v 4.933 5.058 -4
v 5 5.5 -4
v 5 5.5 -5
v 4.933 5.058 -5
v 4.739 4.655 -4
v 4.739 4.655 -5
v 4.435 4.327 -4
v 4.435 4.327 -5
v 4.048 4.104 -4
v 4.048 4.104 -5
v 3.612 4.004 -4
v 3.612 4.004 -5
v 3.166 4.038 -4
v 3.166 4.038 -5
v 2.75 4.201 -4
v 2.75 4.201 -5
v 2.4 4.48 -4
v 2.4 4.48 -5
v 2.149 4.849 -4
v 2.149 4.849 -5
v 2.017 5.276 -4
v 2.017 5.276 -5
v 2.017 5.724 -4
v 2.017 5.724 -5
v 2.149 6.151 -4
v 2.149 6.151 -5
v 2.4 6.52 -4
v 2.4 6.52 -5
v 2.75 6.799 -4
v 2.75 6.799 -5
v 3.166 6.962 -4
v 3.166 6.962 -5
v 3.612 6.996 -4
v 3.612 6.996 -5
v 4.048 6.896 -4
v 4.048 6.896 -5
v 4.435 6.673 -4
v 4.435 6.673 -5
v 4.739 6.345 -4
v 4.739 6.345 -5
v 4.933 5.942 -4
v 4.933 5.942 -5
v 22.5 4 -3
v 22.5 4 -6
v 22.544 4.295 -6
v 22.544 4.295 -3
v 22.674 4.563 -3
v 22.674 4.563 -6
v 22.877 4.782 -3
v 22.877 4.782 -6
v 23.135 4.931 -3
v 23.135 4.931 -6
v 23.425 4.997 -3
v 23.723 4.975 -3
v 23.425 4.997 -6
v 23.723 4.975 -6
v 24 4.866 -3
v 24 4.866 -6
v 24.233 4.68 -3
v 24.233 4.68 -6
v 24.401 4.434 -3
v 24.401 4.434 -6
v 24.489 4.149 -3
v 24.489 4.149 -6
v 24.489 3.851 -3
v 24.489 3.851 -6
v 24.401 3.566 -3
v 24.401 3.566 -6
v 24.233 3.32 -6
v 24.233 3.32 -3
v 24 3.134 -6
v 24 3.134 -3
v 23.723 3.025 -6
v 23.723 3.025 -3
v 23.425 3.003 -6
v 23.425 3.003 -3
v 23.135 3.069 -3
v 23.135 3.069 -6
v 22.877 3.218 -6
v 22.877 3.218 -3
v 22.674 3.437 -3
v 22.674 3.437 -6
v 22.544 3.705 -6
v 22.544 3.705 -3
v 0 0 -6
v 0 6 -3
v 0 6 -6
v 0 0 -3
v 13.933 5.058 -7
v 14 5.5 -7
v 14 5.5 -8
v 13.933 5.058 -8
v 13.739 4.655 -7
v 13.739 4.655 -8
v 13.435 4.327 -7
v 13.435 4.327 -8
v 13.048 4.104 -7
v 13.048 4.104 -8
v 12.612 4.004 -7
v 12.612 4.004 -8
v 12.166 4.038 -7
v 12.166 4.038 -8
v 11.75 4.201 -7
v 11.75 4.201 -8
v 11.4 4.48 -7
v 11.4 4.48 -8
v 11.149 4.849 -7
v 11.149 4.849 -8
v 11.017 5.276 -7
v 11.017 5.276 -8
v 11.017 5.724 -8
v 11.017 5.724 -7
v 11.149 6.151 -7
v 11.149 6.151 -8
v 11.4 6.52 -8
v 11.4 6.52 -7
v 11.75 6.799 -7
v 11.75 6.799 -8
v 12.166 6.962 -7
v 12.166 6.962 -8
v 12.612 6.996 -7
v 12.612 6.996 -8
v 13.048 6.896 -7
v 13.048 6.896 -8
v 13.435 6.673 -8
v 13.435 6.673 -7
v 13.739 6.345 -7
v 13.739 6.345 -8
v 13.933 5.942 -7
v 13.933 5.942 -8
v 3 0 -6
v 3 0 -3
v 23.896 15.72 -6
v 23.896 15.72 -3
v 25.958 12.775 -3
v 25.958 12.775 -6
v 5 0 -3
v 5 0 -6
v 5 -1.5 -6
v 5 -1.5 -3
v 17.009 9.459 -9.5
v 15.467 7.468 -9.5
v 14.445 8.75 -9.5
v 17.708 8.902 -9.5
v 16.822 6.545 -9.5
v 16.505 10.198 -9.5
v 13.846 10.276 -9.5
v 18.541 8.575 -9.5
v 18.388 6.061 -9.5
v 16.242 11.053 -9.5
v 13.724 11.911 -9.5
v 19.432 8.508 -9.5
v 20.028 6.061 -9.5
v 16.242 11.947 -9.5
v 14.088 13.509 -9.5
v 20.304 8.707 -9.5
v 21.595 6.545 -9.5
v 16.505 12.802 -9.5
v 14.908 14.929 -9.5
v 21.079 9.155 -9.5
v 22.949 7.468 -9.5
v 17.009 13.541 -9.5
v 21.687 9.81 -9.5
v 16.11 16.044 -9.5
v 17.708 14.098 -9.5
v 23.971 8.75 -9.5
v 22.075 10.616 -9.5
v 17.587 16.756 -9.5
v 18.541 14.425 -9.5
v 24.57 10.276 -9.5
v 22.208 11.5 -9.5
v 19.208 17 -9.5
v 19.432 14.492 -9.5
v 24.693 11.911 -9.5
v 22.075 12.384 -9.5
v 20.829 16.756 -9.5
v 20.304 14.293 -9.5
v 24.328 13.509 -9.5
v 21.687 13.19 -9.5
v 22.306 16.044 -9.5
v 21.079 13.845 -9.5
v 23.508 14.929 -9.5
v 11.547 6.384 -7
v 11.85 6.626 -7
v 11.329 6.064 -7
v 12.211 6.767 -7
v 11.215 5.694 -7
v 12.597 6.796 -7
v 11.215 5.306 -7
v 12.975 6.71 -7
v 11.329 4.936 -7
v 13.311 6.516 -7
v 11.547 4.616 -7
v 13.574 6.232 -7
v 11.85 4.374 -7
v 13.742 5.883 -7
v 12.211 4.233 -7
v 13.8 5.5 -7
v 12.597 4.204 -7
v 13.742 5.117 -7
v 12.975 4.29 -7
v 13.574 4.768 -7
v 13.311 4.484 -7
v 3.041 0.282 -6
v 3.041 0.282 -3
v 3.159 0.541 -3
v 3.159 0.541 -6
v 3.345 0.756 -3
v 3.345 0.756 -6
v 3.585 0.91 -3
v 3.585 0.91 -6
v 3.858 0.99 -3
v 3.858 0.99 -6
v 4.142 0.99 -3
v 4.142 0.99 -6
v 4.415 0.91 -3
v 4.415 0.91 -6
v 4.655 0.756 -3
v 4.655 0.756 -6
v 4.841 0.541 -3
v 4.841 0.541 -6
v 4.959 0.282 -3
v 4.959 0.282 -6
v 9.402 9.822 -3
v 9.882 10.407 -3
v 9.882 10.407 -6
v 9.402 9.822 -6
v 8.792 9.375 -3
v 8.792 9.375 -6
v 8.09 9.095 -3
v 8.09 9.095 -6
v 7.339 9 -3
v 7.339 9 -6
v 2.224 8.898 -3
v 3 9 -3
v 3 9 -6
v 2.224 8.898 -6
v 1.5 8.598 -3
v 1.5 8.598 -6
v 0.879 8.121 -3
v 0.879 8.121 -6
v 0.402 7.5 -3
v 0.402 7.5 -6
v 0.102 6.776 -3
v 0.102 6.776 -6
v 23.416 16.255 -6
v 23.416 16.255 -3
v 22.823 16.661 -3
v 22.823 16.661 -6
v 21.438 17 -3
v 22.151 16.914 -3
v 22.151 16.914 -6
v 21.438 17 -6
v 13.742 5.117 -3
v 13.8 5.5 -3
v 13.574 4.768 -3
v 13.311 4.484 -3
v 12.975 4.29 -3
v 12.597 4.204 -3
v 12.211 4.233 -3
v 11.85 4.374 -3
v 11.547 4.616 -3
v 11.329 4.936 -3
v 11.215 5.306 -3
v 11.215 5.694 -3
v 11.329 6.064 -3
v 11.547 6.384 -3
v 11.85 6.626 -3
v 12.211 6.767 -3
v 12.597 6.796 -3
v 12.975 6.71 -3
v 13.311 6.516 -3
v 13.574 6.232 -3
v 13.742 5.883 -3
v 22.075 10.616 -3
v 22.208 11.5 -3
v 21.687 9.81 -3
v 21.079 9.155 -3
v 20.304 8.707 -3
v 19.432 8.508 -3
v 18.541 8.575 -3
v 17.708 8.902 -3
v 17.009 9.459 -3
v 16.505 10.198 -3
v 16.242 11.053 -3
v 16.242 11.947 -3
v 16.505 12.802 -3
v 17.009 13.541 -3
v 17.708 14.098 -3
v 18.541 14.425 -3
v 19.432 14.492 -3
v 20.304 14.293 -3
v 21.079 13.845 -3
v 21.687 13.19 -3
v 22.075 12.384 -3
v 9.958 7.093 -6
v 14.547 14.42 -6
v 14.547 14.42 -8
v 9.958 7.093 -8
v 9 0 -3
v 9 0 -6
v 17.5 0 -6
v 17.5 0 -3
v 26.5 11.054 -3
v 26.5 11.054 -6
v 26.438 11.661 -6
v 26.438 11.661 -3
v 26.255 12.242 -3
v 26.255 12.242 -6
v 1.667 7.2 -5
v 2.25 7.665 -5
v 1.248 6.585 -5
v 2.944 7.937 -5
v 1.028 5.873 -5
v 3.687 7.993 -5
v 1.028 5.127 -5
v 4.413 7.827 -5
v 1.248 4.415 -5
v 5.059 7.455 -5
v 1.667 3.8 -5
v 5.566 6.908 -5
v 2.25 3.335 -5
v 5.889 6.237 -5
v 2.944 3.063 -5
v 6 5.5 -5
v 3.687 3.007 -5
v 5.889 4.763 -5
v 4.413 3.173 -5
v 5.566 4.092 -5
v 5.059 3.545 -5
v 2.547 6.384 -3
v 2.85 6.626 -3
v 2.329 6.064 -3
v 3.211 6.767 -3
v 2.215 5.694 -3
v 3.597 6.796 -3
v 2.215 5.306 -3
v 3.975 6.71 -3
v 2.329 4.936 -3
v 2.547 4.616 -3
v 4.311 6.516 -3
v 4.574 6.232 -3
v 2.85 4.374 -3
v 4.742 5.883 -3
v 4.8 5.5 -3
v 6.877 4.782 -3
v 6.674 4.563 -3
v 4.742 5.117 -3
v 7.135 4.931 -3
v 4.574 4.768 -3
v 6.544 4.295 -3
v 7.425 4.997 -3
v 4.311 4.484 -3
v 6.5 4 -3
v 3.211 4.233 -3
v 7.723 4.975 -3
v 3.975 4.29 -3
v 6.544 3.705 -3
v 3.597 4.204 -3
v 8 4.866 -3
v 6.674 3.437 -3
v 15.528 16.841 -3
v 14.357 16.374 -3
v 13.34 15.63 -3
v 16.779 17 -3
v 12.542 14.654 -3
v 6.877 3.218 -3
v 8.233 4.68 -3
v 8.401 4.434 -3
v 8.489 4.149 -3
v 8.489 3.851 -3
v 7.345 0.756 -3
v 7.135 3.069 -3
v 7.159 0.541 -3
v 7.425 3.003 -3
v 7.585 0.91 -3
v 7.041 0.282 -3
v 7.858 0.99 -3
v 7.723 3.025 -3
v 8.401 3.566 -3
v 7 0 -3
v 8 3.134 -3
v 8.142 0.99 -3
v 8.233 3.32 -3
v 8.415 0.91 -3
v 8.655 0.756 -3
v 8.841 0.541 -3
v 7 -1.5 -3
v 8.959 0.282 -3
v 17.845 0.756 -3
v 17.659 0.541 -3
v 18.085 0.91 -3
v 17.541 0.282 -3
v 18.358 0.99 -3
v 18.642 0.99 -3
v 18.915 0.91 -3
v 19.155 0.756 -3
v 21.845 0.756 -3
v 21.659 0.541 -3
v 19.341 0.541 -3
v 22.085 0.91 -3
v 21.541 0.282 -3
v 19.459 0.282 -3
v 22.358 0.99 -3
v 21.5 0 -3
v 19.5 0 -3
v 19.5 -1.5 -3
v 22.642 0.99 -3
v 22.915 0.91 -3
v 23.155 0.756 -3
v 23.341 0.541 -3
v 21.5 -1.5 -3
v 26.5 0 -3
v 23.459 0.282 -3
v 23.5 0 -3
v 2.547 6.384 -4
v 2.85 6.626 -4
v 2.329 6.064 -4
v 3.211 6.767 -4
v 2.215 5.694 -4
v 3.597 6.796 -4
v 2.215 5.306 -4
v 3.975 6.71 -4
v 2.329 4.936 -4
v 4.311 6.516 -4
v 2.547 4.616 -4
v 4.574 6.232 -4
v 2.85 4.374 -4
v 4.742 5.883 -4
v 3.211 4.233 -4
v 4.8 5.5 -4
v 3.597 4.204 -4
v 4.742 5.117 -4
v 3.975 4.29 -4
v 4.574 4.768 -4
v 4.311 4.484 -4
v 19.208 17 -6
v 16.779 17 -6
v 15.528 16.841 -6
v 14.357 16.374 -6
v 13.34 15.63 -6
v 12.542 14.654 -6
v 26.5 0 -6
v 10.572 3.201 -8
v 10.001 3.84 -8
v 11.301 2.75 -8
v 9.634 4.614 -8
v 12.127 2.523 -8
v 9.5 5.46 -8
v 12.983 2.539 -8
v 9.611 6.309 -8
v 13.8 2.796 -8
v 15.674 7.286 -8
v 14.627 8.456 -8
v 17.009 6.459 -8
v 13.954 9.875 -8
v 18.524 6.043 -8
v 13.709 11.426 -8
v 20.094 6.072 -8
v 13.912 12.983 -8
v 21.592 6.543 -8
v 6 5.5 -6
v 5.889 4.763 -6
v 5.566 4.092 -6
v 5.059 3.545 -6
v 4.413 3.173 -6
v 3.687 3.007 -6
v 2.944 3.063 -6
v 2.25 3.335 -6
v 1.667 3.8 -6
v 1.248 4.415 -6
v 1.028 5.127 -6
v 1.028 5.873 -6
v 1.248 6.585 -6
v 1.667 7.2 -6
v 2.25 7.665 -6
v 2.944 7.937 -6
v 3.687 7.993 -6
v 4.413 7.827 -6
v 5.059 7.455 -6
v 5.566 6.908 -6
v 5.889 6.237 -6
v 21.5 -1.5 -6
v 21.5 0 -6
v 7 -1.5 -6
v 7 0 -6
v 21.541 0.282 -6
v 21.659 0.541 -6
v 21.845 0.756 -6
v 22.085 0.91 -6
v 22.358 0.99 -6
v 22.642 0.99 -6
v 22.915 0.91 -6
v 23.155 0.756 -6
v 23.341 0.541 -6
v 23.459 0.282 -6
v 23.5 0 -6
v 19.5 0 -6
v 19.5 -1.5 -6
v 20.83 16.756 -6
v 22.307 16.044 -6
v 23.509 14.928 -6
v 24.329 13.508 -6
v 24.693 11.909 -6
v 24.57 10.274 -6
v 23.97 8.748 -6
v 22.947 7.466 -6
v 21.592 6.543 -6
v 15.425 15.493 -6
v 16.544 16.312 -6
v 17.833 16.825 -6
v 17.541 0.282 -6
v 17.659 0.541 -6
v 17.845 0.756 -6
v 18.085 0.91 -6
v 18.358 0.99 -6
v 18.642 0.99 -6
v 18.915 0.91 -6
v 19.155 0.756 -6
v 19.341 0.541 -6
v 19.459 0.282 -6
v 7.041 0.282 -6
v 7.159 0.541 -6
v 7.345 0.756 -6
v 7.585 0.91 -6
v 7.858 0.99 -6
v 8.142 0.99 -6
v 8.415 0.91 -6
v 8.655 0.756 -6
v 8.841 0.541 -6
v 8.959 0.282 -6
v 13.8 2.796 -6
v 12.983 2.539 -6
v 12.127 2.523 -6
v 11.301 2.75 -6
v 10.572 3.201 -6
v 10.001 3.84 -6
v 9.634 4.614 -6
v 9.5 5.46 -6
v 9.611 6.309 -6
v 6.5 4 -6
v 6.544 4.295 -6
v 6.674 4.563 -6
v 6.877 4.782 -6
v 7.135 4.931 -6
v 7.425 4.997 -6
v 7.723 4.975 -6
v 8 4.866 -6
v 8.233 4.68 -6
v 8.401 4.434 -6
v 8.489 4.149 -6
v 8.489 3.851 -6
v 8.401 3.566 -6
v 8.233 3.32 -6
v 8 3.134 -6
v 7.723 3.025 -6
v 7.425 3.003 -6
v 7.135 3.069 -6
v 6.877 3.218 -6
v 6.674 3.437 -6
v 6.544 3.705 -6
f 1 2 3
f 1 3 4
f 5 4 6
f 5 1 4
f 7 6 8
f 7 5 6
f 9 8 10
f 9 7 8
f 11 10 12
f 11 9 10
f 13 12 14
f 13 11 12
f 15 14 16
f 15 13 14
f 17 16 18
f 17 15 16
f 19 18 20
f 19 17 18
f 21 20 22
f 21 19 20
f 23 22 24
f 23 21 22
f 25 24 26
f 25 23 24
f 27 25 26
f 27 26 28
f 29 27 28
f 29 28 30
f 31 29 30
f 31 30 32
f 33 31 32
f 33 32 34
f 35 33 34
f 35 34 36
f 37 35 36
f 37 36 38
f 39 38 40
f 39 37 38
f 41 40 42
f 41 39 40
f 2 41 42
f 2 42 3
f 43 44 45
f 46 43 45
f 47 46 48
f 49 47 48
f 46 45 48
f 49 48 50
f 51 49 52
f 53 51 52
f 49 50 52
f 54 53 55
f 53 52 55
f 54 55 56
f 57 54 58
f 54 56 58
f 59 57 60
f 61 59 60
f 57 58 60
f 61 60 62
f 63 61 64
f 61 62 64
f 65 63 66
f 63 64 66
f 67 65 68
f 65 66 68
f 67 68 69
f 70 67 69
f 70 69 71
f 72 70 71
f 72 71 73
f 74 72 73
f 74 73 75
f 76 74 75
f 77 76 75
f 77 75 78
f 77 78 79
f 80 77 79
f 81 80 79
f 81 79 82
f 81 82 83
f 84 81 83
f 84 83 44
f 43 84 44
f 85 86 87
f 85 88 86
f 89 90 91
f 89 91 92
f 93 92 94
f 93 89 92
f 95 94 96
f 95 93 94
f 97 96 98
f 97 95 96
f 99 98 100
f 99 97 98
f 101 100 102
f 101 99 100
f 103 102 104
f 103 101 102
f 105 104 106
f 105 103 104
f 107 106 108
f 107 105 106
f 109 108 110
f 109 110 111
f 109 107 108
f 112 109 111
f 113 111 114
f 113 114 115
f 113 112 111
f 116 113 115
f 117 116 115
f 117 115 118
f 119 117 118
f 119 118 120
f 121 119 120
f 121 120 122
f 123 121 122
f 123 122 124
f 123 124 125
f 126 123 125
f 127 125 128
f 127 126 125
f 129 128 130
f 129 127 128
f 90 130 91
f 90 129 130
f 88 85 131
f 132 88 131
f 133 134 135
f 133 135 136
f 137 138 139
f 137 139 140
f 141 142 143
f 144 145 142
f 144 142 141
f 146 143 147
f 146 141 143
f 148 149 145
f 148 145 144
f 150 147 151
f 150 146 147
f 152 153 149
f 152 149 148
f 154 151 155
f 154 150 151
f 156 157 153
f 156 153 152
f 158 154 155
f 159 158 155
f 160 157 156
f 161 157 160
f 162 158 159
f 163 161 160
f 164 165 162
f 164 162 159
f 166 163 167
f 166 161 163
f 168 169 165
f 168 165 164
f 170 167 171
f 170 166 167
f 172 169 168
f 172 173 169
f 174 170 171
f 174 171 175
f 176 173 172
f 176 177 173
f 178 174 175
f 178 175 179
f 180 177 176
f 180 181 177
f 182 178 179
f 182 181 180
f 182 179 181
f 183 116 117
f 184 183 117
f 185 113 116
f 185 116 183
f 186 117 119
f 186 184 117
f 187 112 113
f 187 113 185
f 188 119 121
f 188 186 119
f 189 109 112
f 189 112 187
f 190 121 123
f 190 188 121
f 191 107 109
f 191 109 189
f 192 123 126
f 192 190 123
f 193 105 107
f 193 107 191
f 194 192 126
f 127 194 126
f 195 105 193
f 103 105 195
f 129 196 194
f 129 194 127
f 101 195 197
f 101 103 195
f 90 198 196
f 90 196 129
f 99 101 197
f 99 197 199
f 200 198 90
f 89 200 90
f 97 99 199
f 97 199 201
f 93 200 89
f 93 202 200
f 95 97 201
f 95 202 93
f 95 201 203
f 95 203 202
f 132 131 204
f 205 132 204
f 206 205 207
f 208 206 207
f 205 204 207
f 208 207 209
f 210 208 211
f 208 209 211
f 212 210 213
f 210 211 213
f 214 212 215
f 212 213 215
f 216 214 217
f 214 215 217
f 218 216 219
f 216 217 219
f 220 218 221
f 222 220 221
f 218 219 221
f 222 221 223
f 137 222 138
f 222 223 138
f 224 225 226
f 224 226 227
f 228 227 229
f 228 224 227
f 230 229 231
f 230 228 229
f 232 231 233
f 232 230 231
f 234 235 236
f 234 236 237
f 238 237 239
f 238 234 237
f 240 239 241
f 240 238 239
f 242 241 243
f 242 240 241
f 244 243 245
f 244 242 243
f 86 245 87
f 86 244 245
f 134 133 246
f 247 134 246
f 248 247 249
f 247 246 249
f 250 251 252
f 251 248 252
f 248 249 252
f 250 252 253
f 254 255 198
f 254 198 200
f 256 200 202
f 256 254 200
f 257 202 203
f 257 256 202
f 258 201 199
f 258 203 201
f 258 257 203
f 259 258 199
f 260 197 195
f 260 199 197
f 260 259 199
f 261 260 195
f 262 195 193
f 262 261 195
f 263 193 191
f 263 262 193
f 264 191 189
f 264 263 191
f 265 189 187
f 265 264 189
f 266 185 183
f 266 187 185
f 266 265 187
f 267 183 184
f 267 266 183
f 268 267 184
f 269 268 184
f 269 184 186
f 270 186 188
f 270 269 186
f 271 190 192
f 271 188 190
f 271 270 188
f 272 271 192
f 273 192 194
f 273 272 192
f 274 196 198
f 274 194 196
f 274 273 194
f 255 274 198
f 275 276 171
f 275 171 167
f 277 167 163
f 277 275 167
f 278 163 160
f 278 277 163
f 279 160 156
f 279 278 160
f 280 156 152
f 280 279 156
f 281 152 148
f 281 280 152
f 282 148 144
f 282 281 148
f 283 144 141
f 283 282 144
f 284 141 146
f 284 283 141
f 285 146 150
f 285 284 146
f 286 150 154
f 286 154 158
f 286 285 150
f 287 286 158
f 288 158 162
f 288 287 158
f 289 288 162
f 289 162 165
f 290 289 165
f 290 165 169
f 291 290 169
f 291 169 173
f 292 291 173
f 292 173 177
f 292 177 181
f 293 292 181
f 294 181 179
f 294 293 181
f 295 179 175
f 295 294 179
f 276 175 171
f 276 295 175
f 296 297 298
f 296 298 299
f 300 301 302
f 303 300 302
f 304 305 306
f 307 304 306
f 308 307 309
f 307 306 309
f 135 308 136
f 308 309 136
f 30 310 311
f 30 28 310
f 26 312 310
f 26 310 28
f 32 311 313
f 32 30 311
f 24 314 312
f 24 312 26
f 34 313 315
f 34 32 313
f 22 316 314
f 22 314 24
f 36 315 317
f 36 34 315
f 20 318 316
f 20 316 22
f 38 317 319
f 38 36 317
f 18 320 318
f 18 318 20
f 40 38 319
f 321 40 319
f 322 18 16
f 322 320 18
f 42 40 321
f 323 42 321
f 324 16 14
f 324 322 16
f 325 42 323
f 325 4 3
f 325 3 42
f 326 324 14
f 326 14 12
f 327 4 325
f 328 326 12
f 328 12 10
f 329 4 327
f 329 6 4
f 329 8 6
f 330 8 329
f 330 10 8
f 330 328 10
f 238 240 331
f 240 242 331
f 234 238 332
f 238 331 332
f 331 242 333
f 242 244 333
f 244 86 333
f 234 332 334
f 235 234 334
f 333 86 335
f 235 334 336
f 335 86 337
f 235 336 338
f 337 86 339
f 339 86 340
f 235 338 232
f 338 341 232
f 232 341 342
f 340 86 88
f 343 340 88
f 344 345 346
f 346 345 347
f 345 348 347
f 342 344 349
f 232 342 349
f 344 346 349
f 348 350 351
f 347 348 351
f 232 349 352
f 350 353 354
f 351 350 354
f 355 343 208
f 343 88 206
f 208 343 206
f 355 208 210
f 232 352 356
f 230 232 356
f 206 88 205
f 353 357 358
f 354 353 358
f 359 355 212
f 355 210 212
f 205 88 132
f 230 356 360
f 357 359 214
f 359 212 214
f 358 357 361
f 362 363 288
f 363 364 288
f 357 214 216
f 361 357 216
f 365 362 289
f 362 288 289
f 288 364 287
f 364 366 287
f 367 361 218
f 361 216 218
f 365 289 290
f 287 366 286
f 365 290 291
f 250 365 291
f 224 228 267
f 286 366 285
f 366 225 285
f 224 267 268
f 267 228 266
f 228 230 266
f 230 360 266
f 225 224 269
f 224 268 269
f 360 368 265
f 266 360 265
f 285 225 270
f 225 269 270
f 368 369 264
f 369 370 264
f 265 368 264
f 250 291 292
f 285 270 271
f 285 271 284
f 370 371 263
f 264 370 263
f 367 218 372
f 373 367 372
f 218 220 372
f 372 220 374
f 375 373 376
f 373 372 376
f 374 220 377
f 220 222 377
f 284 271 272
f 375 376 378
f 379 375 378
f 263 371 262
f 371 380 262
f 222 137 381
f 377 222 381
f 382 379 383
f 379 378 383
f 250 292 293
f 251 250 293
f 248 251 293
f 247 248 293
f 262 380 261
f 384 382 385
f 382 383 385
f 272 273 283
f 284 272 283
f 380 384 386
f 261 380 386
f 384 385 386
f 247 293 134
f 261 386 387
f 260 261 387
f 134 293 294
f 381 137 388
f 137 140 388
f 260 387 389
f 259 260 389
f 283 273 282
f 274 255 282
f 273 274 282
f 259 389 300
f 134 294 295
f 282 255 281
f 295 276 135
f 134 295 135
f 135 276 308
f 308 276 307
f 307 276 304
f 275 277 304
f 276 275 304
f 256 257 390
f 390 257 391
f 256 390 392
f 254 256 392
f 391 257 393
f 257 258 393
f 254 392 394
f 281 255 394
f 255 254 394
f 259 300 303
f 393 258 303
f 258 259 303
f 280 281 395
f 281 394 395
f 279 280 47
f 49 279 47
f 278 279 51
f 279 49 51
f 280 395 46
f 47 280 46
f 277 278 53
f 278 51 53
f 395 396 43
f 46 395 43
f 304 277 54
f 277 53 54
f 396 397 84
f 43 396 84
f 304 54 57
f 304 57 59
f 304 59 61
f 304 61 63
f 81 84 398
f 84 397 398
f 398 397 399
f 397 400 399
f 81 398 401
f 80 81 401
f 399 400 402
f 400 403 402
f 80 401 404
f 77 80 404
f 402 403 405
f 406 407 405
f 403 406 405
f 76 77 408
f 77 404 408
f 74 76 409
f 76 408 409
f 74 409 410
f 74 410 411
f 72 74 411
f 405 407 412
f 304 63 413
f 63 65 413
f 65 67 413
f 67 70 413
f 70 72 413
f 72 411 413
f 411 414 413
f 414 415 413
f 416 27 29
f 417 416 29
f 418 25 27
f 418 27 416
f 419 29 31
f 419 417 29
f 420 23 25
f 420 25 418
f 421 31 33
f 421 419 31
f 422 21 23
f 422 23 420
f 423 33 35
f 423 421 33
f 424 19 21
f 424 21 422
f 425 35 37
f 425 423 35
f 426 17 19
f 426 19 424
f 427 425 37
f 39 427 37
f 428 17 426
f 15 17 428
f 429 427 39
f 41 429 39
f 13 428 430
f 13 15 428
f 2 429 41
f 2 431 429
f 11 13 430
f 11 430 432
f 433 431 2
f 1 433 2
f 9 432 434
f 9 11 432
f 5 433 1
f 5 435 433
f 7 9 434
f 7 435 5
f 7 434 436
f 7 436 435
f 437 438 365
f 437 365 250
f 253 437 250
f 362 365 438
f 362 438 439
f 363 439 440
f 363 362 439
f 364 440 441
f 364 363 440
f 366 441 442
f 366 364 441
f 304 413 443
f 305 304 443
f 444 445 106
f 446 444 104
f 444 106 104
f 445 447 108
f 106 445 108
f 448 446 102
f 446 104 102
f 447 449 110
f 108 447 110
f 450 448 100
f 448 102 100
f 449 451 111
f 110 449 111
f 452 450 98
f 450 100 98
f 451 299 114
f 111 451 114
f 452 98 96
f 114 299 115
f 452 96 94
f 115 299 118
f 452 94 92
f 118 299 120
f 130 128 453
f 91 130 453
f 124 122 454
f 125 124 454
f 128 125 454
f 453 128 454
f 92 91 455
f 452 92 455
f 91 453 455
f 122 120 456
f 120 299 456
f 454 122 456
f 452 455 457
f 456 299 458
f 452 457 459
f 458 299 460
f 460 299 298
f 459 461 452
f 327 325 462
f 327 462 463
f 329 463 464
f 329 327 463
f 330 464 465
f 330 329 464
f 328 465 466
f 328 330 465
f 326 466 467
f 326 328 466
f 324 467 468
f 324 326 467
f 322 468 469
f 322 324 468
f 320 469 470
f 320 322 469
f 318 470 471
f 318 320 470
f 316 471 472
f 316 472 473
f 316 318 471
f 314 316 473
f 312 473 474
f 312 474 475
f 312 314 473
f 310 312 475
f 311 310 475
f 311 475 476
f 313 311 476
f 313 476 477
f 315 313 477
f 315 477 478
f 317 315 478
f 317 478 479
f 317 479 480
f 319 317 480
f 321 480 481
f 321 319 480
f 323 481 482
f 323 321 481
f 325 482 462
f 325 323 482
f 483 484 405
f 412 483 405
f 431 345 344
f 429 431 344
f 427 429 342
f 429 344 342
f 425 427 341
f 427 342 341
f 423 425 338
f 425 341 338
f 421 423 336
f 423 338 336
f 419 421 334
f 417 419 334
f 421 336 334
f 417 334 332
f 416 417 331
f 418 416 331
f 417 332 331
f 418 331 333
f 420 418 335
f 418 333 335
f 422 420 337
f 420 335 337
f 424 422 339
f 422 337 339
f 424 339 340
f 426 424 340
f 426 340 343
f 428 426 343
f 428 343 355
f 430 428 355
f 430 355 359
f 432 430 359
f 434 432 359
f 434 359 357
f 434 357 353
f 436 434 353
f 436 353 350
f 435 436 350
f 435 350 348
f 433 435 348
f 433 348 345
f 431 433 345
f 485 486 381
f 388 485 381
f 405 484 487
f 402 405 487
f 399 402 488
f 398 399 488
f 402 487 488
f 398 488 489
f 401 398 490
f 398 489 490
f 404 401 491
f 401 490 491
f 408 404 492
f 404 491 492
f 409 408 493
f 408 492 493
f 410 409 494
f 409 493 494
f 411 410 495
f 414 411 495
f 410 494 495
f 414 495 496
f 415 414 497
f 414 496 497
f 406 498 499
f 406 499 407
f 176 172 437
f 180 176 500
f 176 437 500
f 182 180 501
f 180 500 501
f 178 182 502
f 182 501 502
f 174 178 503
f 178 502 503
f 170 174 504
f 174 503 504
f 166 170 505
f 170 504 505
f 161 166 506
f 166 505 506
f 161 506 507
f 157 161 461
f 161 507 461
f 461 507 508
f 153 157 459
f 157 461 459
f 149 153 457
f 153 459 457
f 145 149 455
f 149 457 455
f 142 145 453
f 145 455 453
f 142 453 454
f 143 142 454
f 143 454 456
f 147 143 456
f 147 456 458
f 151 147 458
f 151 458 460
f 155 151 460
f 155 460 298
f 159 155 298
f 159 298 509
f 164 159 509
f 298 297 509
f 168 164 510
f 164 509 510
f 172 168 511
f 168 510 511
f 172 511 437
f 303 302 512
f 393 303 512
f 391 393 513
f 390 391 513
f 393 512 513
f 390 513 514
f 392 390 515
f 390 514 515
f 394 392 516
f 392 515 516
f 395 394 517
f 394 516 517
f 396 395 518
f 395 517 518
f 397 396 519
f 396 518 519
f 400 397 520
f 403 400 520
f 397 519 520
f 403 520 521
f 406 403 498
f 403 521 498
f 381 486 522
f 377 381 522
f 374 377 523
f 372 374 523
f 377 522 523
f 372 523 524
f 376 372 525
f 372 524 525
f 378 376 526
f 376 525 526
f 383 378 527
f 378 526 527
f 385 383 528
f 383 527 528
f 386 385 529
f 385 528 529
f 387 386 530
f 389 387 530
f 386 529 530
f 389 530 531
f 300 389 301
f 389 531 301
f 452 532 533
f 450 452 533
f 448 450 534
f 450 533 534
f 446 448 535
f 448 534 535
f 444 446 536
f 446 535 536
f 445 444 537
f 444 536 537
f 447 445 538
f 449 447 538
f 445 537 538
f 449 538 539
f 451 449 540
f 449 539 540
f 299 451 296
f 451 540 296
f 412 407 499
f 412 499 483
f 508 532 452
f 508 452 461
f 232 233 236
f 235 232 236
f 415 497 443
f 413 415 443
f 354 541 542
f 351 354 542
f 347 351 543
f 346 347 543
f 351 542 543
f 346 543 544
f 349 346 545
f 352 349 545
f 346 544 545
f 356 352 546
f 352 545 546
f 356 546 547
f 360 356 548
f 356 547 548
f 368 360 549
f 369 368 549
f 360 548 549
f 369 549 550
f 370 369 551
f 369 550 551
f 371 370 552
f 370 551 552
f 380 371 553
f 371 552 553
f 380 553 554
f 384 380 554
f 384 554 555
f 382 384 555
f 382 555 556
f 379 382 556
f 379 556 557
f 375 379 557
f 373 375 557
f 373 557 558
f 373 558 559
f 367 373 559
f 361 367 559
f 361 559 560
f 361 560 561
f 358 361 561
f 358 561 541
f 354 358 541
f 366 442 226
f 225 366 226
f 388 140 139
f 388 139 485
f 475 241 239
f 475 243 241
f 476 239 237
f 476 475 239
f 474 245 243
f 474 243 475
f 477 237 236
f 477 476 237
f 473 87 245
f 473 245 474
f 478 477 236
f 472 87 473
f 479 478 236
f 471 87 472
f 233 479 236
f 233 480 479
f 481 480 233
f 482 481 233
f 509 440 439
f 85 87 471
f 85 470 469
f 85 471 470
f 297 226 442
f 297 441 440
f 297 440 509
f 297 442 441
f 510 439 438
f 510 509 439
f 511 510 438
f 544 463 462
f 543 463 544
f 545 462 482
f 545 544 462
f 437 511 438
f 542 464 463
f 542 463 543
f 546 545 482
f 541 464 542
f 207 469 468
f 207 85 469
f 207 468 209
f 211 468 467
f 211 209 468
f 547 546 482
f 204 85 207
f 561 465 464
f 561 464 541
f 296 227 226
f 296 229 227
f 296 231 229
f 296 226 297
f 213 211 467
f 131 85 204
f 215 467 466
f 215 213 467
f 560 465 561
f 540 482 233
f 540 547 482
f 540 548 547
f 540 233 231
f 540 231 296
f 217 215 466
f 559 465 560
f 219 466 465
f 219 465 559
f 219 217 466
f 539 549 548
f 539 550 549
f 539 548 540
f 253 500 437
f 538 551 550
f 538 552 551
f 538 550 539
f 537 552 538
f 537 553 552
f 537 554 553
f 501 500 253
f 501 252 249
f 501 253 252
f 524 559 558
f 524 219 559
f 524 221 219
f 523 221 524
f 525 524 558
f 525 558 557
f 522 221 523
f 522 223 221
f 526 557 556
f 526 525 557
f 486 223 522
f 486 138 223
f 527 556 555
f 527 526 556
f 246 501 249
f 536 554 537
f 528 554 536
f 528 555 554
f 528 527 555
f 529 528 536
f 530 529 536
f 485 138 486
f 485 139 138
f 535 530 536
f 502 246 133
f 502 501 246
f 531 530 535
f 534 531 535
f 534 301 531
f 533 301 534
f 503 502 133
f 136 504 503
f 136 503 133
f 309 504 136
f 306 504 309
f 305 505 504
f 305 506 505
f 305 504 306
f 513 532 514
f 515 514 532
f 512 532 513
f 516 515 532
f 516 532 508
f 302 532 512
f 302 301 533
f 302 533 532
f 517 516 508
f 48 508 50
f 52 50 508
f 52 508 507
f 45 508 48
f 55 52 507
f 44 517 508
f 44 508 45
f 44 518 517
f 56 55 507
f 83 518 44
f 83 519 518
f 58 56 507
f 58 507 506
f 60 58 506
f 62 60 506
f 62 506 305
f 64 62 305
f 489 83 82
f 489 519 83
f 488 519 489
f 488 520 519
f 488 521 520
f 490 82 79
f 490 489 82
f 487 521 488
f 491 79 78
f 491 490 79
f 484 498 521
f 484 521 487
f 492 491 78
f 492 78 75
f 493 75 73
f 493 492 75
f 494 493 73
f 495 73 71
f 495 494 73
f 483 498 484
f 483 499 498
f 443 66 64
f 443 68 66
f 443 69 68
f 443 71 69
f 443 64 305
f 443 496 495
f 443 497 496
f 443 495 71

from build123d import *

# Parameters (mm, degrees)
SKETCH1_W                            = 26.5
SKETCH1_H                            = 6
BOSS_EXTRUDE1_DEPTH                  = 17
SKETCH2_R                            = 1.5
CUT_EXTRUDE1_DEPTH                   = 1
SKETCH3_R                            = 1.3
CUT_EXTRUDE2_DEPTH                   = 32.878676259
SKETCH4_R                            = 3
CUT_EXTRUDE3_DEPTH                   = 33.050741021
SKETCH5_R                            = 2.5
CUT_EXTRUDE4_DEPTH                   = 1.5
SKETCH6_R                            = 1.5
CUT_EXTRUDE8_DEPTH                   = 1
SKETCH7_R                            = 1.3
CUT_EXTRUDE9_DEPTH                   = 32.678068123
CUT_EXTRUDE10_START                  = -1
SKETCH8_R                            = 2.5
CUT_EXTRUDE10_DEPTH                  = 1
CUT_EXTRUDE11_START                  = -1
SKETCH9_R                            = 1.5
CUT_EXTRUDE11_DEPTH                  = 1
SKETCH10_R                           = 5.5
SKETCH10_R_2                         = 3
BOSS_EXTRUDE2_DEPTH                  = 3.5
SKETCH11_R                           = 3
SKETCH11_R_2                         = 1.3
BOSS_EXTRUDE4_DEPTH                  = 2
CUT_EXTRUDE12_START                  = -1
SKETCH12_R                           = 1.5
CUT_EXTRUDE12_DEPTH                  = 1
SKETCH17_W                           = 2
SKETCH17_H                           = 6
BOSS_EXTRUDE6_DEPTH                  = 1.5
SKETCH18_R                           = 1
CUT_EXTRUDE17_DEPTH                  = 33.050741021
CHAMFER2_SIZE                        = 5
CHAMFER2_SIZE2                       = 3.5
FILLET11_R                           = 3
BOSS_EXTRUDE7_DEPTH                  = 2
CUT_EXTRUDE19_DEPTH                  = 33.050741021
FILLET13_R                           = 5
FILLET14_R                           = 3
FILLET15_R                           = 3
SKIZZE1_R                            = 1
SCHNITT_LINEAR_AUSTRAGEN1_DEPTH      = 33.050741021
SCHNITT_LINEAR_AUSTRAGEN2_DEPTH      = 31.409702399
SCHNITT_LINEAR_AUSTRAGEN2_DEPTH_BACK = 31.409702399
SKIZZE2_W                            = 26.5
SKIZZE2_H                            = 3


with BuildPart() as part:
    # Sketch1 → Boss-Extrude1 (new body)
    with BuildSketch(Plane(origin=(0, 0, 0), x_dir=(1, 0, 0), z_dir=(0, 1, 0))):
        with Locations((13.25, 3)):
            Rectangle(SKETCH1_W, SKETCH1_H)
    extrude(amount=BOSS_EXTRUDE1_DEPTH)

    # Sketch2 → Cut-Extrude1 (cut)
    with BuildSketch(Plane.XY):
        with Locations((12.5, 5.5)):
            Circle(SKETCH2_R)
    extrude(amount=-CUT_EXTRUDE1_DEPTH, mode=Mode.SUBTRACT)

    # Sketch3 → Cut-Extrude2 (cut, through all)
    with BuildSketch(Plane.XY.offset(-1)):
        with Locations((12.5, 5.5)):
            Circle(SKETCH3_R)
    extrude(amount=-CUT_EXTRUDE2_DEPTH, mode=Mode.SUBTRACT)

    # Sketch4 → Cut-Extrude3 (cut, through all)
    with BuildSketch(Plane.XY):
        with Locations((19.208203932, 11.5)):
            Circle(SKETCH4_R)
    extrude(amount=-CUT_EXTRUDE3_DEPTH, mode=Mode.SUBTRACT)

    # Sketch5 → Cut-Extrude4 (cut)
    with BuildSketch(Plane.XY):
        with Locations((3.5, 5.5)):
            Circle(SKETCH5_R)
    extrude(amount=-CUT_EXTRUDE4_DEPTH, mode=Mode.SUBTRACT)

    # Sketch6 → Cut-Extrude8 (cut)
    with BuildSketch(Plane.XY.offset(-1.5)):
        with Locations((3.5, 5.5)):
            Circle(SKETCH6_R)
    extrude(amount=-CUT_EXTRUDE8_DEPTH, mode=Mode.SUBTRACT)

    # Sketch7 → Cut-Extrude9 (cut, through all)
    with BuildSketch(Plane.XY.offset(-2.5)):
        with Locations((3.5, 5.5)):
            Circle(SKETCH7_R)
    extrude(amount=-CUT_EXTRUDE9_DEPTH, mode=Mode.SUBTRACT)

    # Sketch8 → Cut-Extrude10 (cut)
    with BuildSketch(Plane(origin=(0, 0, -6), x_dir=(-1, 0, 0), z_dir=(0, 0, -1)).offset(CUT_EXTRUDE10_START)):
        with Locations(Location((-3.5, 5.5, 0), (0, 0, 180))):
            Circle(SKETCH8_R)
    extrude(amount=CUT_EXTRUDE10_DEPTH, mode=Mode.SUBTRACT)

    # Sketch9 → Cut-Extrude11 (cut)
    with BuildSketch(Plane(origin=(0, 0, -5), x_dir=(-1, 0, 0), z_dir=(0, 0, -1)).offset(CUT_EXTRUDE11_START)):
        with Locations(Location((-3.5, 5.5, 0), (0, 0, 180))):
            Circle(SKETCH9_R)
    extrude(amount=CUT_EXTRUDE11_DEPTH, mode=Mode.SUBTRACT)

    # Sketch10 → Boss-Extrude2 (add)
    with BuildSketch(Plane(origin=(0, 0, -6), x_dir=(-1, 0, 0), z_dir=(0, 0, -1))):
        with Locations(Location((-19.208203932, 11.5, 0), (0, 0, 90))):
            Circle(SKETCH10_R)
        with Locations(Location((-19.208203932, 11.5, 0), (0, 0, 180))):
            Circle(SKETCH10_R_2, mode=Mode.SUBTRACT)
    extrude(amount=BOSS_EXTRUDE2_DEPTH)

    # Sketch11 → Boss-Extrude4 (add)
    with BuildSketch(Plane(origin=(0, 0, -6), x_dir=(-1, 0, 0), z_dir=(0, 0, -1))):
        with Locations(Location((-12.5, 5.5, 0), (0, 0, 180))):
            Circle(SKETCH11_R)
        with Locations(Location((-12.5, 5.5, 0), (0, 0, 180))):
            Circle(SKETCH11_R_2, mode=Mode.SUBTRACT)
    extrude(amount=BOSS_EXTRUDE4_DEPTH)

    # Sketch12 → Cut-Extrude12 (cut)
    with BuildSketch(Plane(origin=(0, 0, -8), x_dir=(-1, 0, 0), z_dir=(0, 0, -1)).offset(CUT_EXTRUDE12_START)):
        with Locations(Location((-12.5, 5.5, 0), (0, 0, 180))):
            Circle(SKETCH12_R)
    extrude(amount=CUT_EXTRUDE12_DEPTH, mode=Mode.SUBTRACT)

    # Sketch17 → Boss-Extrude6 (add)
    with BuildSketch(Plane.XZ):
        with Locations((6, -3)):
            Rectangle(SKETCH17_W, SKETCH17_H)
        with Locations((20.5, -3)):
            Rectangle(SKETCH17_W, SKETCH17_H)
    extrude(amount=BOSS_EXTRUDE6_DEPTH)

    # Sketch18 → Cut-Extrude17 (cut, through all)
    with BuildSketch(Plane(origin=(0, 0, -6), x_dir=(-1, 0, 0), z_dir=(0, 0, -1))):
        with Locations((-22.5, 0)):
            Circle(SKETCH18_R)
        with Locations((-18.5, 0)):
            Circle(SKETCH18_R)
        with Locations((-8, 0)):
            Circle(SKETCH18_R)
        with Locations((-4, 0)):
            Circle(SKETCH18_R)
    extrude(amount=-CUT_EXTRUDE17_DEPTH, mode=Mode.SUBTRACT)

    # Chamfer2
    chamfer2_edges = [part.edges().sort_by_distance(p)[0] for p in [
        (26.5, 17, -3),
    ]]
    chamfer2_side = [part.faces().sort_by_distance(p)[0] for p in [
        (26.5, 8.5, -3),
    ]]
    chamfer(chamfer2_edges, length=CHAMFER2_SIZE, length2=CHAMFER2_SIZE2, reference=chamfer2_side[0])

    # Fillet11
    fillet11_edges = [part.edges().sort_by_distance(p)[0] for p in [
        (23, 17, -3),
        (26.5, 12, -3),
    ]]
    fillet(fillet11_edges, radius=FILLET11_R)

    # Sketch19 → Boss-Extrude7 (add)
    with BuildSketch(Plane(origin=(0, 0, -6), x_dir=(-1, 0, 0), z_dir=(0, 0, -1))):
        with BuildLine():
            Line((-14.547099294, 14.419606745), (-9.957579288, 7.09251277))
            ThreePointArc((-9.957579288, 7.09251277), (-14.736067977, 7.5), (-13.800160725, 2.796376119))
            Line((-13.800160725, 2.796376119), (-21.591831928, 6.543356218))
            ThreePointArc((-21.591831928, 6.543356218), (-15.108745974, 7.833333333), (-14.547099294, 14.419606745))
        make_face()
    extrude(amount=BOSS_EXTRUDE7_DEPTH)

    # Sketch20 → Cut-Extrude19 (cut, through all)
    with BuildSketch(Plane(origin=(0, 0, -6), x_dir=(-1, 0, 0), z_dir=(0, 0, -1))):
        Polygon((0, 17), (-14.011012575, 17), (-9, 9), (0, 9), align=None)
    extrude(amount=-CUT_EXTRUDE19_DEPTH, mode=Mode.SUBTRACT)

    # Fillet13
    fillet13_edges = [part.edges().sort_by_distance(p)[0] for p in [
        (14.011012575, 17, -3),
    ]]
    fillet(fillet13_edges, radius=FILLET13_R)

    # Fillet14
    fillet14_edges = [part.edges().sort_by_distance(p)[0] for p in [
        (9, 9, -3),
    ]]
    fillet(fillet14_edges, radius=FILLET14_R)

    # Fillet15
    fillet15_edges = [part.edges().sort_by_distance(p)[0] for p in [
        (0, 9, -3),
    ]]
    fillet(fillet15_edges, radius=FILLET15_R)

    # Skizze1 → Schnitt-Linear austragen1 (cut, through all)
    with BuildSketch(Plane(origin=(0, 0, -6), x_dir=(-1, 0, 0), z_dir=(0, 0, -1))):
        with Locations((-23.5, 4)):
            Circle(SKIZZE1_R)
        with Locations((-7.5, 4)):
            Circle(SKIZZE1_R)
    extrude(amount=-SCHNITT_LINEAR_AUSTRAGEN1_DEPTH, mode=Mode.SUBTRACT)

    # Skizze2 → Schnitt-Linear austragen2 (cut, two sides: drawn at the far end of the back side and taken through both)
    with BuildSketch(Plane(origin=(0, 5.5, 0), x_dir=(1, 0, 0), z_dir=(0, 1, 0)).offset(-SCHNITT_LINEAR_AUSTRAGEN2_DEPTH_BACK)):
        with Locations((13.25, 1.5)):
            Rectangle(SKIZZE2_W, SKIZZE2_H)
    extrude(amount=SCHNITT_LINEAR_AUSTRAGEN2_DEPTH + SCHNITT_LINEAR_AUSTRAGEN2_DEPTH_BACK, mode=Mode.SUBTRACT)


solid = part.part
